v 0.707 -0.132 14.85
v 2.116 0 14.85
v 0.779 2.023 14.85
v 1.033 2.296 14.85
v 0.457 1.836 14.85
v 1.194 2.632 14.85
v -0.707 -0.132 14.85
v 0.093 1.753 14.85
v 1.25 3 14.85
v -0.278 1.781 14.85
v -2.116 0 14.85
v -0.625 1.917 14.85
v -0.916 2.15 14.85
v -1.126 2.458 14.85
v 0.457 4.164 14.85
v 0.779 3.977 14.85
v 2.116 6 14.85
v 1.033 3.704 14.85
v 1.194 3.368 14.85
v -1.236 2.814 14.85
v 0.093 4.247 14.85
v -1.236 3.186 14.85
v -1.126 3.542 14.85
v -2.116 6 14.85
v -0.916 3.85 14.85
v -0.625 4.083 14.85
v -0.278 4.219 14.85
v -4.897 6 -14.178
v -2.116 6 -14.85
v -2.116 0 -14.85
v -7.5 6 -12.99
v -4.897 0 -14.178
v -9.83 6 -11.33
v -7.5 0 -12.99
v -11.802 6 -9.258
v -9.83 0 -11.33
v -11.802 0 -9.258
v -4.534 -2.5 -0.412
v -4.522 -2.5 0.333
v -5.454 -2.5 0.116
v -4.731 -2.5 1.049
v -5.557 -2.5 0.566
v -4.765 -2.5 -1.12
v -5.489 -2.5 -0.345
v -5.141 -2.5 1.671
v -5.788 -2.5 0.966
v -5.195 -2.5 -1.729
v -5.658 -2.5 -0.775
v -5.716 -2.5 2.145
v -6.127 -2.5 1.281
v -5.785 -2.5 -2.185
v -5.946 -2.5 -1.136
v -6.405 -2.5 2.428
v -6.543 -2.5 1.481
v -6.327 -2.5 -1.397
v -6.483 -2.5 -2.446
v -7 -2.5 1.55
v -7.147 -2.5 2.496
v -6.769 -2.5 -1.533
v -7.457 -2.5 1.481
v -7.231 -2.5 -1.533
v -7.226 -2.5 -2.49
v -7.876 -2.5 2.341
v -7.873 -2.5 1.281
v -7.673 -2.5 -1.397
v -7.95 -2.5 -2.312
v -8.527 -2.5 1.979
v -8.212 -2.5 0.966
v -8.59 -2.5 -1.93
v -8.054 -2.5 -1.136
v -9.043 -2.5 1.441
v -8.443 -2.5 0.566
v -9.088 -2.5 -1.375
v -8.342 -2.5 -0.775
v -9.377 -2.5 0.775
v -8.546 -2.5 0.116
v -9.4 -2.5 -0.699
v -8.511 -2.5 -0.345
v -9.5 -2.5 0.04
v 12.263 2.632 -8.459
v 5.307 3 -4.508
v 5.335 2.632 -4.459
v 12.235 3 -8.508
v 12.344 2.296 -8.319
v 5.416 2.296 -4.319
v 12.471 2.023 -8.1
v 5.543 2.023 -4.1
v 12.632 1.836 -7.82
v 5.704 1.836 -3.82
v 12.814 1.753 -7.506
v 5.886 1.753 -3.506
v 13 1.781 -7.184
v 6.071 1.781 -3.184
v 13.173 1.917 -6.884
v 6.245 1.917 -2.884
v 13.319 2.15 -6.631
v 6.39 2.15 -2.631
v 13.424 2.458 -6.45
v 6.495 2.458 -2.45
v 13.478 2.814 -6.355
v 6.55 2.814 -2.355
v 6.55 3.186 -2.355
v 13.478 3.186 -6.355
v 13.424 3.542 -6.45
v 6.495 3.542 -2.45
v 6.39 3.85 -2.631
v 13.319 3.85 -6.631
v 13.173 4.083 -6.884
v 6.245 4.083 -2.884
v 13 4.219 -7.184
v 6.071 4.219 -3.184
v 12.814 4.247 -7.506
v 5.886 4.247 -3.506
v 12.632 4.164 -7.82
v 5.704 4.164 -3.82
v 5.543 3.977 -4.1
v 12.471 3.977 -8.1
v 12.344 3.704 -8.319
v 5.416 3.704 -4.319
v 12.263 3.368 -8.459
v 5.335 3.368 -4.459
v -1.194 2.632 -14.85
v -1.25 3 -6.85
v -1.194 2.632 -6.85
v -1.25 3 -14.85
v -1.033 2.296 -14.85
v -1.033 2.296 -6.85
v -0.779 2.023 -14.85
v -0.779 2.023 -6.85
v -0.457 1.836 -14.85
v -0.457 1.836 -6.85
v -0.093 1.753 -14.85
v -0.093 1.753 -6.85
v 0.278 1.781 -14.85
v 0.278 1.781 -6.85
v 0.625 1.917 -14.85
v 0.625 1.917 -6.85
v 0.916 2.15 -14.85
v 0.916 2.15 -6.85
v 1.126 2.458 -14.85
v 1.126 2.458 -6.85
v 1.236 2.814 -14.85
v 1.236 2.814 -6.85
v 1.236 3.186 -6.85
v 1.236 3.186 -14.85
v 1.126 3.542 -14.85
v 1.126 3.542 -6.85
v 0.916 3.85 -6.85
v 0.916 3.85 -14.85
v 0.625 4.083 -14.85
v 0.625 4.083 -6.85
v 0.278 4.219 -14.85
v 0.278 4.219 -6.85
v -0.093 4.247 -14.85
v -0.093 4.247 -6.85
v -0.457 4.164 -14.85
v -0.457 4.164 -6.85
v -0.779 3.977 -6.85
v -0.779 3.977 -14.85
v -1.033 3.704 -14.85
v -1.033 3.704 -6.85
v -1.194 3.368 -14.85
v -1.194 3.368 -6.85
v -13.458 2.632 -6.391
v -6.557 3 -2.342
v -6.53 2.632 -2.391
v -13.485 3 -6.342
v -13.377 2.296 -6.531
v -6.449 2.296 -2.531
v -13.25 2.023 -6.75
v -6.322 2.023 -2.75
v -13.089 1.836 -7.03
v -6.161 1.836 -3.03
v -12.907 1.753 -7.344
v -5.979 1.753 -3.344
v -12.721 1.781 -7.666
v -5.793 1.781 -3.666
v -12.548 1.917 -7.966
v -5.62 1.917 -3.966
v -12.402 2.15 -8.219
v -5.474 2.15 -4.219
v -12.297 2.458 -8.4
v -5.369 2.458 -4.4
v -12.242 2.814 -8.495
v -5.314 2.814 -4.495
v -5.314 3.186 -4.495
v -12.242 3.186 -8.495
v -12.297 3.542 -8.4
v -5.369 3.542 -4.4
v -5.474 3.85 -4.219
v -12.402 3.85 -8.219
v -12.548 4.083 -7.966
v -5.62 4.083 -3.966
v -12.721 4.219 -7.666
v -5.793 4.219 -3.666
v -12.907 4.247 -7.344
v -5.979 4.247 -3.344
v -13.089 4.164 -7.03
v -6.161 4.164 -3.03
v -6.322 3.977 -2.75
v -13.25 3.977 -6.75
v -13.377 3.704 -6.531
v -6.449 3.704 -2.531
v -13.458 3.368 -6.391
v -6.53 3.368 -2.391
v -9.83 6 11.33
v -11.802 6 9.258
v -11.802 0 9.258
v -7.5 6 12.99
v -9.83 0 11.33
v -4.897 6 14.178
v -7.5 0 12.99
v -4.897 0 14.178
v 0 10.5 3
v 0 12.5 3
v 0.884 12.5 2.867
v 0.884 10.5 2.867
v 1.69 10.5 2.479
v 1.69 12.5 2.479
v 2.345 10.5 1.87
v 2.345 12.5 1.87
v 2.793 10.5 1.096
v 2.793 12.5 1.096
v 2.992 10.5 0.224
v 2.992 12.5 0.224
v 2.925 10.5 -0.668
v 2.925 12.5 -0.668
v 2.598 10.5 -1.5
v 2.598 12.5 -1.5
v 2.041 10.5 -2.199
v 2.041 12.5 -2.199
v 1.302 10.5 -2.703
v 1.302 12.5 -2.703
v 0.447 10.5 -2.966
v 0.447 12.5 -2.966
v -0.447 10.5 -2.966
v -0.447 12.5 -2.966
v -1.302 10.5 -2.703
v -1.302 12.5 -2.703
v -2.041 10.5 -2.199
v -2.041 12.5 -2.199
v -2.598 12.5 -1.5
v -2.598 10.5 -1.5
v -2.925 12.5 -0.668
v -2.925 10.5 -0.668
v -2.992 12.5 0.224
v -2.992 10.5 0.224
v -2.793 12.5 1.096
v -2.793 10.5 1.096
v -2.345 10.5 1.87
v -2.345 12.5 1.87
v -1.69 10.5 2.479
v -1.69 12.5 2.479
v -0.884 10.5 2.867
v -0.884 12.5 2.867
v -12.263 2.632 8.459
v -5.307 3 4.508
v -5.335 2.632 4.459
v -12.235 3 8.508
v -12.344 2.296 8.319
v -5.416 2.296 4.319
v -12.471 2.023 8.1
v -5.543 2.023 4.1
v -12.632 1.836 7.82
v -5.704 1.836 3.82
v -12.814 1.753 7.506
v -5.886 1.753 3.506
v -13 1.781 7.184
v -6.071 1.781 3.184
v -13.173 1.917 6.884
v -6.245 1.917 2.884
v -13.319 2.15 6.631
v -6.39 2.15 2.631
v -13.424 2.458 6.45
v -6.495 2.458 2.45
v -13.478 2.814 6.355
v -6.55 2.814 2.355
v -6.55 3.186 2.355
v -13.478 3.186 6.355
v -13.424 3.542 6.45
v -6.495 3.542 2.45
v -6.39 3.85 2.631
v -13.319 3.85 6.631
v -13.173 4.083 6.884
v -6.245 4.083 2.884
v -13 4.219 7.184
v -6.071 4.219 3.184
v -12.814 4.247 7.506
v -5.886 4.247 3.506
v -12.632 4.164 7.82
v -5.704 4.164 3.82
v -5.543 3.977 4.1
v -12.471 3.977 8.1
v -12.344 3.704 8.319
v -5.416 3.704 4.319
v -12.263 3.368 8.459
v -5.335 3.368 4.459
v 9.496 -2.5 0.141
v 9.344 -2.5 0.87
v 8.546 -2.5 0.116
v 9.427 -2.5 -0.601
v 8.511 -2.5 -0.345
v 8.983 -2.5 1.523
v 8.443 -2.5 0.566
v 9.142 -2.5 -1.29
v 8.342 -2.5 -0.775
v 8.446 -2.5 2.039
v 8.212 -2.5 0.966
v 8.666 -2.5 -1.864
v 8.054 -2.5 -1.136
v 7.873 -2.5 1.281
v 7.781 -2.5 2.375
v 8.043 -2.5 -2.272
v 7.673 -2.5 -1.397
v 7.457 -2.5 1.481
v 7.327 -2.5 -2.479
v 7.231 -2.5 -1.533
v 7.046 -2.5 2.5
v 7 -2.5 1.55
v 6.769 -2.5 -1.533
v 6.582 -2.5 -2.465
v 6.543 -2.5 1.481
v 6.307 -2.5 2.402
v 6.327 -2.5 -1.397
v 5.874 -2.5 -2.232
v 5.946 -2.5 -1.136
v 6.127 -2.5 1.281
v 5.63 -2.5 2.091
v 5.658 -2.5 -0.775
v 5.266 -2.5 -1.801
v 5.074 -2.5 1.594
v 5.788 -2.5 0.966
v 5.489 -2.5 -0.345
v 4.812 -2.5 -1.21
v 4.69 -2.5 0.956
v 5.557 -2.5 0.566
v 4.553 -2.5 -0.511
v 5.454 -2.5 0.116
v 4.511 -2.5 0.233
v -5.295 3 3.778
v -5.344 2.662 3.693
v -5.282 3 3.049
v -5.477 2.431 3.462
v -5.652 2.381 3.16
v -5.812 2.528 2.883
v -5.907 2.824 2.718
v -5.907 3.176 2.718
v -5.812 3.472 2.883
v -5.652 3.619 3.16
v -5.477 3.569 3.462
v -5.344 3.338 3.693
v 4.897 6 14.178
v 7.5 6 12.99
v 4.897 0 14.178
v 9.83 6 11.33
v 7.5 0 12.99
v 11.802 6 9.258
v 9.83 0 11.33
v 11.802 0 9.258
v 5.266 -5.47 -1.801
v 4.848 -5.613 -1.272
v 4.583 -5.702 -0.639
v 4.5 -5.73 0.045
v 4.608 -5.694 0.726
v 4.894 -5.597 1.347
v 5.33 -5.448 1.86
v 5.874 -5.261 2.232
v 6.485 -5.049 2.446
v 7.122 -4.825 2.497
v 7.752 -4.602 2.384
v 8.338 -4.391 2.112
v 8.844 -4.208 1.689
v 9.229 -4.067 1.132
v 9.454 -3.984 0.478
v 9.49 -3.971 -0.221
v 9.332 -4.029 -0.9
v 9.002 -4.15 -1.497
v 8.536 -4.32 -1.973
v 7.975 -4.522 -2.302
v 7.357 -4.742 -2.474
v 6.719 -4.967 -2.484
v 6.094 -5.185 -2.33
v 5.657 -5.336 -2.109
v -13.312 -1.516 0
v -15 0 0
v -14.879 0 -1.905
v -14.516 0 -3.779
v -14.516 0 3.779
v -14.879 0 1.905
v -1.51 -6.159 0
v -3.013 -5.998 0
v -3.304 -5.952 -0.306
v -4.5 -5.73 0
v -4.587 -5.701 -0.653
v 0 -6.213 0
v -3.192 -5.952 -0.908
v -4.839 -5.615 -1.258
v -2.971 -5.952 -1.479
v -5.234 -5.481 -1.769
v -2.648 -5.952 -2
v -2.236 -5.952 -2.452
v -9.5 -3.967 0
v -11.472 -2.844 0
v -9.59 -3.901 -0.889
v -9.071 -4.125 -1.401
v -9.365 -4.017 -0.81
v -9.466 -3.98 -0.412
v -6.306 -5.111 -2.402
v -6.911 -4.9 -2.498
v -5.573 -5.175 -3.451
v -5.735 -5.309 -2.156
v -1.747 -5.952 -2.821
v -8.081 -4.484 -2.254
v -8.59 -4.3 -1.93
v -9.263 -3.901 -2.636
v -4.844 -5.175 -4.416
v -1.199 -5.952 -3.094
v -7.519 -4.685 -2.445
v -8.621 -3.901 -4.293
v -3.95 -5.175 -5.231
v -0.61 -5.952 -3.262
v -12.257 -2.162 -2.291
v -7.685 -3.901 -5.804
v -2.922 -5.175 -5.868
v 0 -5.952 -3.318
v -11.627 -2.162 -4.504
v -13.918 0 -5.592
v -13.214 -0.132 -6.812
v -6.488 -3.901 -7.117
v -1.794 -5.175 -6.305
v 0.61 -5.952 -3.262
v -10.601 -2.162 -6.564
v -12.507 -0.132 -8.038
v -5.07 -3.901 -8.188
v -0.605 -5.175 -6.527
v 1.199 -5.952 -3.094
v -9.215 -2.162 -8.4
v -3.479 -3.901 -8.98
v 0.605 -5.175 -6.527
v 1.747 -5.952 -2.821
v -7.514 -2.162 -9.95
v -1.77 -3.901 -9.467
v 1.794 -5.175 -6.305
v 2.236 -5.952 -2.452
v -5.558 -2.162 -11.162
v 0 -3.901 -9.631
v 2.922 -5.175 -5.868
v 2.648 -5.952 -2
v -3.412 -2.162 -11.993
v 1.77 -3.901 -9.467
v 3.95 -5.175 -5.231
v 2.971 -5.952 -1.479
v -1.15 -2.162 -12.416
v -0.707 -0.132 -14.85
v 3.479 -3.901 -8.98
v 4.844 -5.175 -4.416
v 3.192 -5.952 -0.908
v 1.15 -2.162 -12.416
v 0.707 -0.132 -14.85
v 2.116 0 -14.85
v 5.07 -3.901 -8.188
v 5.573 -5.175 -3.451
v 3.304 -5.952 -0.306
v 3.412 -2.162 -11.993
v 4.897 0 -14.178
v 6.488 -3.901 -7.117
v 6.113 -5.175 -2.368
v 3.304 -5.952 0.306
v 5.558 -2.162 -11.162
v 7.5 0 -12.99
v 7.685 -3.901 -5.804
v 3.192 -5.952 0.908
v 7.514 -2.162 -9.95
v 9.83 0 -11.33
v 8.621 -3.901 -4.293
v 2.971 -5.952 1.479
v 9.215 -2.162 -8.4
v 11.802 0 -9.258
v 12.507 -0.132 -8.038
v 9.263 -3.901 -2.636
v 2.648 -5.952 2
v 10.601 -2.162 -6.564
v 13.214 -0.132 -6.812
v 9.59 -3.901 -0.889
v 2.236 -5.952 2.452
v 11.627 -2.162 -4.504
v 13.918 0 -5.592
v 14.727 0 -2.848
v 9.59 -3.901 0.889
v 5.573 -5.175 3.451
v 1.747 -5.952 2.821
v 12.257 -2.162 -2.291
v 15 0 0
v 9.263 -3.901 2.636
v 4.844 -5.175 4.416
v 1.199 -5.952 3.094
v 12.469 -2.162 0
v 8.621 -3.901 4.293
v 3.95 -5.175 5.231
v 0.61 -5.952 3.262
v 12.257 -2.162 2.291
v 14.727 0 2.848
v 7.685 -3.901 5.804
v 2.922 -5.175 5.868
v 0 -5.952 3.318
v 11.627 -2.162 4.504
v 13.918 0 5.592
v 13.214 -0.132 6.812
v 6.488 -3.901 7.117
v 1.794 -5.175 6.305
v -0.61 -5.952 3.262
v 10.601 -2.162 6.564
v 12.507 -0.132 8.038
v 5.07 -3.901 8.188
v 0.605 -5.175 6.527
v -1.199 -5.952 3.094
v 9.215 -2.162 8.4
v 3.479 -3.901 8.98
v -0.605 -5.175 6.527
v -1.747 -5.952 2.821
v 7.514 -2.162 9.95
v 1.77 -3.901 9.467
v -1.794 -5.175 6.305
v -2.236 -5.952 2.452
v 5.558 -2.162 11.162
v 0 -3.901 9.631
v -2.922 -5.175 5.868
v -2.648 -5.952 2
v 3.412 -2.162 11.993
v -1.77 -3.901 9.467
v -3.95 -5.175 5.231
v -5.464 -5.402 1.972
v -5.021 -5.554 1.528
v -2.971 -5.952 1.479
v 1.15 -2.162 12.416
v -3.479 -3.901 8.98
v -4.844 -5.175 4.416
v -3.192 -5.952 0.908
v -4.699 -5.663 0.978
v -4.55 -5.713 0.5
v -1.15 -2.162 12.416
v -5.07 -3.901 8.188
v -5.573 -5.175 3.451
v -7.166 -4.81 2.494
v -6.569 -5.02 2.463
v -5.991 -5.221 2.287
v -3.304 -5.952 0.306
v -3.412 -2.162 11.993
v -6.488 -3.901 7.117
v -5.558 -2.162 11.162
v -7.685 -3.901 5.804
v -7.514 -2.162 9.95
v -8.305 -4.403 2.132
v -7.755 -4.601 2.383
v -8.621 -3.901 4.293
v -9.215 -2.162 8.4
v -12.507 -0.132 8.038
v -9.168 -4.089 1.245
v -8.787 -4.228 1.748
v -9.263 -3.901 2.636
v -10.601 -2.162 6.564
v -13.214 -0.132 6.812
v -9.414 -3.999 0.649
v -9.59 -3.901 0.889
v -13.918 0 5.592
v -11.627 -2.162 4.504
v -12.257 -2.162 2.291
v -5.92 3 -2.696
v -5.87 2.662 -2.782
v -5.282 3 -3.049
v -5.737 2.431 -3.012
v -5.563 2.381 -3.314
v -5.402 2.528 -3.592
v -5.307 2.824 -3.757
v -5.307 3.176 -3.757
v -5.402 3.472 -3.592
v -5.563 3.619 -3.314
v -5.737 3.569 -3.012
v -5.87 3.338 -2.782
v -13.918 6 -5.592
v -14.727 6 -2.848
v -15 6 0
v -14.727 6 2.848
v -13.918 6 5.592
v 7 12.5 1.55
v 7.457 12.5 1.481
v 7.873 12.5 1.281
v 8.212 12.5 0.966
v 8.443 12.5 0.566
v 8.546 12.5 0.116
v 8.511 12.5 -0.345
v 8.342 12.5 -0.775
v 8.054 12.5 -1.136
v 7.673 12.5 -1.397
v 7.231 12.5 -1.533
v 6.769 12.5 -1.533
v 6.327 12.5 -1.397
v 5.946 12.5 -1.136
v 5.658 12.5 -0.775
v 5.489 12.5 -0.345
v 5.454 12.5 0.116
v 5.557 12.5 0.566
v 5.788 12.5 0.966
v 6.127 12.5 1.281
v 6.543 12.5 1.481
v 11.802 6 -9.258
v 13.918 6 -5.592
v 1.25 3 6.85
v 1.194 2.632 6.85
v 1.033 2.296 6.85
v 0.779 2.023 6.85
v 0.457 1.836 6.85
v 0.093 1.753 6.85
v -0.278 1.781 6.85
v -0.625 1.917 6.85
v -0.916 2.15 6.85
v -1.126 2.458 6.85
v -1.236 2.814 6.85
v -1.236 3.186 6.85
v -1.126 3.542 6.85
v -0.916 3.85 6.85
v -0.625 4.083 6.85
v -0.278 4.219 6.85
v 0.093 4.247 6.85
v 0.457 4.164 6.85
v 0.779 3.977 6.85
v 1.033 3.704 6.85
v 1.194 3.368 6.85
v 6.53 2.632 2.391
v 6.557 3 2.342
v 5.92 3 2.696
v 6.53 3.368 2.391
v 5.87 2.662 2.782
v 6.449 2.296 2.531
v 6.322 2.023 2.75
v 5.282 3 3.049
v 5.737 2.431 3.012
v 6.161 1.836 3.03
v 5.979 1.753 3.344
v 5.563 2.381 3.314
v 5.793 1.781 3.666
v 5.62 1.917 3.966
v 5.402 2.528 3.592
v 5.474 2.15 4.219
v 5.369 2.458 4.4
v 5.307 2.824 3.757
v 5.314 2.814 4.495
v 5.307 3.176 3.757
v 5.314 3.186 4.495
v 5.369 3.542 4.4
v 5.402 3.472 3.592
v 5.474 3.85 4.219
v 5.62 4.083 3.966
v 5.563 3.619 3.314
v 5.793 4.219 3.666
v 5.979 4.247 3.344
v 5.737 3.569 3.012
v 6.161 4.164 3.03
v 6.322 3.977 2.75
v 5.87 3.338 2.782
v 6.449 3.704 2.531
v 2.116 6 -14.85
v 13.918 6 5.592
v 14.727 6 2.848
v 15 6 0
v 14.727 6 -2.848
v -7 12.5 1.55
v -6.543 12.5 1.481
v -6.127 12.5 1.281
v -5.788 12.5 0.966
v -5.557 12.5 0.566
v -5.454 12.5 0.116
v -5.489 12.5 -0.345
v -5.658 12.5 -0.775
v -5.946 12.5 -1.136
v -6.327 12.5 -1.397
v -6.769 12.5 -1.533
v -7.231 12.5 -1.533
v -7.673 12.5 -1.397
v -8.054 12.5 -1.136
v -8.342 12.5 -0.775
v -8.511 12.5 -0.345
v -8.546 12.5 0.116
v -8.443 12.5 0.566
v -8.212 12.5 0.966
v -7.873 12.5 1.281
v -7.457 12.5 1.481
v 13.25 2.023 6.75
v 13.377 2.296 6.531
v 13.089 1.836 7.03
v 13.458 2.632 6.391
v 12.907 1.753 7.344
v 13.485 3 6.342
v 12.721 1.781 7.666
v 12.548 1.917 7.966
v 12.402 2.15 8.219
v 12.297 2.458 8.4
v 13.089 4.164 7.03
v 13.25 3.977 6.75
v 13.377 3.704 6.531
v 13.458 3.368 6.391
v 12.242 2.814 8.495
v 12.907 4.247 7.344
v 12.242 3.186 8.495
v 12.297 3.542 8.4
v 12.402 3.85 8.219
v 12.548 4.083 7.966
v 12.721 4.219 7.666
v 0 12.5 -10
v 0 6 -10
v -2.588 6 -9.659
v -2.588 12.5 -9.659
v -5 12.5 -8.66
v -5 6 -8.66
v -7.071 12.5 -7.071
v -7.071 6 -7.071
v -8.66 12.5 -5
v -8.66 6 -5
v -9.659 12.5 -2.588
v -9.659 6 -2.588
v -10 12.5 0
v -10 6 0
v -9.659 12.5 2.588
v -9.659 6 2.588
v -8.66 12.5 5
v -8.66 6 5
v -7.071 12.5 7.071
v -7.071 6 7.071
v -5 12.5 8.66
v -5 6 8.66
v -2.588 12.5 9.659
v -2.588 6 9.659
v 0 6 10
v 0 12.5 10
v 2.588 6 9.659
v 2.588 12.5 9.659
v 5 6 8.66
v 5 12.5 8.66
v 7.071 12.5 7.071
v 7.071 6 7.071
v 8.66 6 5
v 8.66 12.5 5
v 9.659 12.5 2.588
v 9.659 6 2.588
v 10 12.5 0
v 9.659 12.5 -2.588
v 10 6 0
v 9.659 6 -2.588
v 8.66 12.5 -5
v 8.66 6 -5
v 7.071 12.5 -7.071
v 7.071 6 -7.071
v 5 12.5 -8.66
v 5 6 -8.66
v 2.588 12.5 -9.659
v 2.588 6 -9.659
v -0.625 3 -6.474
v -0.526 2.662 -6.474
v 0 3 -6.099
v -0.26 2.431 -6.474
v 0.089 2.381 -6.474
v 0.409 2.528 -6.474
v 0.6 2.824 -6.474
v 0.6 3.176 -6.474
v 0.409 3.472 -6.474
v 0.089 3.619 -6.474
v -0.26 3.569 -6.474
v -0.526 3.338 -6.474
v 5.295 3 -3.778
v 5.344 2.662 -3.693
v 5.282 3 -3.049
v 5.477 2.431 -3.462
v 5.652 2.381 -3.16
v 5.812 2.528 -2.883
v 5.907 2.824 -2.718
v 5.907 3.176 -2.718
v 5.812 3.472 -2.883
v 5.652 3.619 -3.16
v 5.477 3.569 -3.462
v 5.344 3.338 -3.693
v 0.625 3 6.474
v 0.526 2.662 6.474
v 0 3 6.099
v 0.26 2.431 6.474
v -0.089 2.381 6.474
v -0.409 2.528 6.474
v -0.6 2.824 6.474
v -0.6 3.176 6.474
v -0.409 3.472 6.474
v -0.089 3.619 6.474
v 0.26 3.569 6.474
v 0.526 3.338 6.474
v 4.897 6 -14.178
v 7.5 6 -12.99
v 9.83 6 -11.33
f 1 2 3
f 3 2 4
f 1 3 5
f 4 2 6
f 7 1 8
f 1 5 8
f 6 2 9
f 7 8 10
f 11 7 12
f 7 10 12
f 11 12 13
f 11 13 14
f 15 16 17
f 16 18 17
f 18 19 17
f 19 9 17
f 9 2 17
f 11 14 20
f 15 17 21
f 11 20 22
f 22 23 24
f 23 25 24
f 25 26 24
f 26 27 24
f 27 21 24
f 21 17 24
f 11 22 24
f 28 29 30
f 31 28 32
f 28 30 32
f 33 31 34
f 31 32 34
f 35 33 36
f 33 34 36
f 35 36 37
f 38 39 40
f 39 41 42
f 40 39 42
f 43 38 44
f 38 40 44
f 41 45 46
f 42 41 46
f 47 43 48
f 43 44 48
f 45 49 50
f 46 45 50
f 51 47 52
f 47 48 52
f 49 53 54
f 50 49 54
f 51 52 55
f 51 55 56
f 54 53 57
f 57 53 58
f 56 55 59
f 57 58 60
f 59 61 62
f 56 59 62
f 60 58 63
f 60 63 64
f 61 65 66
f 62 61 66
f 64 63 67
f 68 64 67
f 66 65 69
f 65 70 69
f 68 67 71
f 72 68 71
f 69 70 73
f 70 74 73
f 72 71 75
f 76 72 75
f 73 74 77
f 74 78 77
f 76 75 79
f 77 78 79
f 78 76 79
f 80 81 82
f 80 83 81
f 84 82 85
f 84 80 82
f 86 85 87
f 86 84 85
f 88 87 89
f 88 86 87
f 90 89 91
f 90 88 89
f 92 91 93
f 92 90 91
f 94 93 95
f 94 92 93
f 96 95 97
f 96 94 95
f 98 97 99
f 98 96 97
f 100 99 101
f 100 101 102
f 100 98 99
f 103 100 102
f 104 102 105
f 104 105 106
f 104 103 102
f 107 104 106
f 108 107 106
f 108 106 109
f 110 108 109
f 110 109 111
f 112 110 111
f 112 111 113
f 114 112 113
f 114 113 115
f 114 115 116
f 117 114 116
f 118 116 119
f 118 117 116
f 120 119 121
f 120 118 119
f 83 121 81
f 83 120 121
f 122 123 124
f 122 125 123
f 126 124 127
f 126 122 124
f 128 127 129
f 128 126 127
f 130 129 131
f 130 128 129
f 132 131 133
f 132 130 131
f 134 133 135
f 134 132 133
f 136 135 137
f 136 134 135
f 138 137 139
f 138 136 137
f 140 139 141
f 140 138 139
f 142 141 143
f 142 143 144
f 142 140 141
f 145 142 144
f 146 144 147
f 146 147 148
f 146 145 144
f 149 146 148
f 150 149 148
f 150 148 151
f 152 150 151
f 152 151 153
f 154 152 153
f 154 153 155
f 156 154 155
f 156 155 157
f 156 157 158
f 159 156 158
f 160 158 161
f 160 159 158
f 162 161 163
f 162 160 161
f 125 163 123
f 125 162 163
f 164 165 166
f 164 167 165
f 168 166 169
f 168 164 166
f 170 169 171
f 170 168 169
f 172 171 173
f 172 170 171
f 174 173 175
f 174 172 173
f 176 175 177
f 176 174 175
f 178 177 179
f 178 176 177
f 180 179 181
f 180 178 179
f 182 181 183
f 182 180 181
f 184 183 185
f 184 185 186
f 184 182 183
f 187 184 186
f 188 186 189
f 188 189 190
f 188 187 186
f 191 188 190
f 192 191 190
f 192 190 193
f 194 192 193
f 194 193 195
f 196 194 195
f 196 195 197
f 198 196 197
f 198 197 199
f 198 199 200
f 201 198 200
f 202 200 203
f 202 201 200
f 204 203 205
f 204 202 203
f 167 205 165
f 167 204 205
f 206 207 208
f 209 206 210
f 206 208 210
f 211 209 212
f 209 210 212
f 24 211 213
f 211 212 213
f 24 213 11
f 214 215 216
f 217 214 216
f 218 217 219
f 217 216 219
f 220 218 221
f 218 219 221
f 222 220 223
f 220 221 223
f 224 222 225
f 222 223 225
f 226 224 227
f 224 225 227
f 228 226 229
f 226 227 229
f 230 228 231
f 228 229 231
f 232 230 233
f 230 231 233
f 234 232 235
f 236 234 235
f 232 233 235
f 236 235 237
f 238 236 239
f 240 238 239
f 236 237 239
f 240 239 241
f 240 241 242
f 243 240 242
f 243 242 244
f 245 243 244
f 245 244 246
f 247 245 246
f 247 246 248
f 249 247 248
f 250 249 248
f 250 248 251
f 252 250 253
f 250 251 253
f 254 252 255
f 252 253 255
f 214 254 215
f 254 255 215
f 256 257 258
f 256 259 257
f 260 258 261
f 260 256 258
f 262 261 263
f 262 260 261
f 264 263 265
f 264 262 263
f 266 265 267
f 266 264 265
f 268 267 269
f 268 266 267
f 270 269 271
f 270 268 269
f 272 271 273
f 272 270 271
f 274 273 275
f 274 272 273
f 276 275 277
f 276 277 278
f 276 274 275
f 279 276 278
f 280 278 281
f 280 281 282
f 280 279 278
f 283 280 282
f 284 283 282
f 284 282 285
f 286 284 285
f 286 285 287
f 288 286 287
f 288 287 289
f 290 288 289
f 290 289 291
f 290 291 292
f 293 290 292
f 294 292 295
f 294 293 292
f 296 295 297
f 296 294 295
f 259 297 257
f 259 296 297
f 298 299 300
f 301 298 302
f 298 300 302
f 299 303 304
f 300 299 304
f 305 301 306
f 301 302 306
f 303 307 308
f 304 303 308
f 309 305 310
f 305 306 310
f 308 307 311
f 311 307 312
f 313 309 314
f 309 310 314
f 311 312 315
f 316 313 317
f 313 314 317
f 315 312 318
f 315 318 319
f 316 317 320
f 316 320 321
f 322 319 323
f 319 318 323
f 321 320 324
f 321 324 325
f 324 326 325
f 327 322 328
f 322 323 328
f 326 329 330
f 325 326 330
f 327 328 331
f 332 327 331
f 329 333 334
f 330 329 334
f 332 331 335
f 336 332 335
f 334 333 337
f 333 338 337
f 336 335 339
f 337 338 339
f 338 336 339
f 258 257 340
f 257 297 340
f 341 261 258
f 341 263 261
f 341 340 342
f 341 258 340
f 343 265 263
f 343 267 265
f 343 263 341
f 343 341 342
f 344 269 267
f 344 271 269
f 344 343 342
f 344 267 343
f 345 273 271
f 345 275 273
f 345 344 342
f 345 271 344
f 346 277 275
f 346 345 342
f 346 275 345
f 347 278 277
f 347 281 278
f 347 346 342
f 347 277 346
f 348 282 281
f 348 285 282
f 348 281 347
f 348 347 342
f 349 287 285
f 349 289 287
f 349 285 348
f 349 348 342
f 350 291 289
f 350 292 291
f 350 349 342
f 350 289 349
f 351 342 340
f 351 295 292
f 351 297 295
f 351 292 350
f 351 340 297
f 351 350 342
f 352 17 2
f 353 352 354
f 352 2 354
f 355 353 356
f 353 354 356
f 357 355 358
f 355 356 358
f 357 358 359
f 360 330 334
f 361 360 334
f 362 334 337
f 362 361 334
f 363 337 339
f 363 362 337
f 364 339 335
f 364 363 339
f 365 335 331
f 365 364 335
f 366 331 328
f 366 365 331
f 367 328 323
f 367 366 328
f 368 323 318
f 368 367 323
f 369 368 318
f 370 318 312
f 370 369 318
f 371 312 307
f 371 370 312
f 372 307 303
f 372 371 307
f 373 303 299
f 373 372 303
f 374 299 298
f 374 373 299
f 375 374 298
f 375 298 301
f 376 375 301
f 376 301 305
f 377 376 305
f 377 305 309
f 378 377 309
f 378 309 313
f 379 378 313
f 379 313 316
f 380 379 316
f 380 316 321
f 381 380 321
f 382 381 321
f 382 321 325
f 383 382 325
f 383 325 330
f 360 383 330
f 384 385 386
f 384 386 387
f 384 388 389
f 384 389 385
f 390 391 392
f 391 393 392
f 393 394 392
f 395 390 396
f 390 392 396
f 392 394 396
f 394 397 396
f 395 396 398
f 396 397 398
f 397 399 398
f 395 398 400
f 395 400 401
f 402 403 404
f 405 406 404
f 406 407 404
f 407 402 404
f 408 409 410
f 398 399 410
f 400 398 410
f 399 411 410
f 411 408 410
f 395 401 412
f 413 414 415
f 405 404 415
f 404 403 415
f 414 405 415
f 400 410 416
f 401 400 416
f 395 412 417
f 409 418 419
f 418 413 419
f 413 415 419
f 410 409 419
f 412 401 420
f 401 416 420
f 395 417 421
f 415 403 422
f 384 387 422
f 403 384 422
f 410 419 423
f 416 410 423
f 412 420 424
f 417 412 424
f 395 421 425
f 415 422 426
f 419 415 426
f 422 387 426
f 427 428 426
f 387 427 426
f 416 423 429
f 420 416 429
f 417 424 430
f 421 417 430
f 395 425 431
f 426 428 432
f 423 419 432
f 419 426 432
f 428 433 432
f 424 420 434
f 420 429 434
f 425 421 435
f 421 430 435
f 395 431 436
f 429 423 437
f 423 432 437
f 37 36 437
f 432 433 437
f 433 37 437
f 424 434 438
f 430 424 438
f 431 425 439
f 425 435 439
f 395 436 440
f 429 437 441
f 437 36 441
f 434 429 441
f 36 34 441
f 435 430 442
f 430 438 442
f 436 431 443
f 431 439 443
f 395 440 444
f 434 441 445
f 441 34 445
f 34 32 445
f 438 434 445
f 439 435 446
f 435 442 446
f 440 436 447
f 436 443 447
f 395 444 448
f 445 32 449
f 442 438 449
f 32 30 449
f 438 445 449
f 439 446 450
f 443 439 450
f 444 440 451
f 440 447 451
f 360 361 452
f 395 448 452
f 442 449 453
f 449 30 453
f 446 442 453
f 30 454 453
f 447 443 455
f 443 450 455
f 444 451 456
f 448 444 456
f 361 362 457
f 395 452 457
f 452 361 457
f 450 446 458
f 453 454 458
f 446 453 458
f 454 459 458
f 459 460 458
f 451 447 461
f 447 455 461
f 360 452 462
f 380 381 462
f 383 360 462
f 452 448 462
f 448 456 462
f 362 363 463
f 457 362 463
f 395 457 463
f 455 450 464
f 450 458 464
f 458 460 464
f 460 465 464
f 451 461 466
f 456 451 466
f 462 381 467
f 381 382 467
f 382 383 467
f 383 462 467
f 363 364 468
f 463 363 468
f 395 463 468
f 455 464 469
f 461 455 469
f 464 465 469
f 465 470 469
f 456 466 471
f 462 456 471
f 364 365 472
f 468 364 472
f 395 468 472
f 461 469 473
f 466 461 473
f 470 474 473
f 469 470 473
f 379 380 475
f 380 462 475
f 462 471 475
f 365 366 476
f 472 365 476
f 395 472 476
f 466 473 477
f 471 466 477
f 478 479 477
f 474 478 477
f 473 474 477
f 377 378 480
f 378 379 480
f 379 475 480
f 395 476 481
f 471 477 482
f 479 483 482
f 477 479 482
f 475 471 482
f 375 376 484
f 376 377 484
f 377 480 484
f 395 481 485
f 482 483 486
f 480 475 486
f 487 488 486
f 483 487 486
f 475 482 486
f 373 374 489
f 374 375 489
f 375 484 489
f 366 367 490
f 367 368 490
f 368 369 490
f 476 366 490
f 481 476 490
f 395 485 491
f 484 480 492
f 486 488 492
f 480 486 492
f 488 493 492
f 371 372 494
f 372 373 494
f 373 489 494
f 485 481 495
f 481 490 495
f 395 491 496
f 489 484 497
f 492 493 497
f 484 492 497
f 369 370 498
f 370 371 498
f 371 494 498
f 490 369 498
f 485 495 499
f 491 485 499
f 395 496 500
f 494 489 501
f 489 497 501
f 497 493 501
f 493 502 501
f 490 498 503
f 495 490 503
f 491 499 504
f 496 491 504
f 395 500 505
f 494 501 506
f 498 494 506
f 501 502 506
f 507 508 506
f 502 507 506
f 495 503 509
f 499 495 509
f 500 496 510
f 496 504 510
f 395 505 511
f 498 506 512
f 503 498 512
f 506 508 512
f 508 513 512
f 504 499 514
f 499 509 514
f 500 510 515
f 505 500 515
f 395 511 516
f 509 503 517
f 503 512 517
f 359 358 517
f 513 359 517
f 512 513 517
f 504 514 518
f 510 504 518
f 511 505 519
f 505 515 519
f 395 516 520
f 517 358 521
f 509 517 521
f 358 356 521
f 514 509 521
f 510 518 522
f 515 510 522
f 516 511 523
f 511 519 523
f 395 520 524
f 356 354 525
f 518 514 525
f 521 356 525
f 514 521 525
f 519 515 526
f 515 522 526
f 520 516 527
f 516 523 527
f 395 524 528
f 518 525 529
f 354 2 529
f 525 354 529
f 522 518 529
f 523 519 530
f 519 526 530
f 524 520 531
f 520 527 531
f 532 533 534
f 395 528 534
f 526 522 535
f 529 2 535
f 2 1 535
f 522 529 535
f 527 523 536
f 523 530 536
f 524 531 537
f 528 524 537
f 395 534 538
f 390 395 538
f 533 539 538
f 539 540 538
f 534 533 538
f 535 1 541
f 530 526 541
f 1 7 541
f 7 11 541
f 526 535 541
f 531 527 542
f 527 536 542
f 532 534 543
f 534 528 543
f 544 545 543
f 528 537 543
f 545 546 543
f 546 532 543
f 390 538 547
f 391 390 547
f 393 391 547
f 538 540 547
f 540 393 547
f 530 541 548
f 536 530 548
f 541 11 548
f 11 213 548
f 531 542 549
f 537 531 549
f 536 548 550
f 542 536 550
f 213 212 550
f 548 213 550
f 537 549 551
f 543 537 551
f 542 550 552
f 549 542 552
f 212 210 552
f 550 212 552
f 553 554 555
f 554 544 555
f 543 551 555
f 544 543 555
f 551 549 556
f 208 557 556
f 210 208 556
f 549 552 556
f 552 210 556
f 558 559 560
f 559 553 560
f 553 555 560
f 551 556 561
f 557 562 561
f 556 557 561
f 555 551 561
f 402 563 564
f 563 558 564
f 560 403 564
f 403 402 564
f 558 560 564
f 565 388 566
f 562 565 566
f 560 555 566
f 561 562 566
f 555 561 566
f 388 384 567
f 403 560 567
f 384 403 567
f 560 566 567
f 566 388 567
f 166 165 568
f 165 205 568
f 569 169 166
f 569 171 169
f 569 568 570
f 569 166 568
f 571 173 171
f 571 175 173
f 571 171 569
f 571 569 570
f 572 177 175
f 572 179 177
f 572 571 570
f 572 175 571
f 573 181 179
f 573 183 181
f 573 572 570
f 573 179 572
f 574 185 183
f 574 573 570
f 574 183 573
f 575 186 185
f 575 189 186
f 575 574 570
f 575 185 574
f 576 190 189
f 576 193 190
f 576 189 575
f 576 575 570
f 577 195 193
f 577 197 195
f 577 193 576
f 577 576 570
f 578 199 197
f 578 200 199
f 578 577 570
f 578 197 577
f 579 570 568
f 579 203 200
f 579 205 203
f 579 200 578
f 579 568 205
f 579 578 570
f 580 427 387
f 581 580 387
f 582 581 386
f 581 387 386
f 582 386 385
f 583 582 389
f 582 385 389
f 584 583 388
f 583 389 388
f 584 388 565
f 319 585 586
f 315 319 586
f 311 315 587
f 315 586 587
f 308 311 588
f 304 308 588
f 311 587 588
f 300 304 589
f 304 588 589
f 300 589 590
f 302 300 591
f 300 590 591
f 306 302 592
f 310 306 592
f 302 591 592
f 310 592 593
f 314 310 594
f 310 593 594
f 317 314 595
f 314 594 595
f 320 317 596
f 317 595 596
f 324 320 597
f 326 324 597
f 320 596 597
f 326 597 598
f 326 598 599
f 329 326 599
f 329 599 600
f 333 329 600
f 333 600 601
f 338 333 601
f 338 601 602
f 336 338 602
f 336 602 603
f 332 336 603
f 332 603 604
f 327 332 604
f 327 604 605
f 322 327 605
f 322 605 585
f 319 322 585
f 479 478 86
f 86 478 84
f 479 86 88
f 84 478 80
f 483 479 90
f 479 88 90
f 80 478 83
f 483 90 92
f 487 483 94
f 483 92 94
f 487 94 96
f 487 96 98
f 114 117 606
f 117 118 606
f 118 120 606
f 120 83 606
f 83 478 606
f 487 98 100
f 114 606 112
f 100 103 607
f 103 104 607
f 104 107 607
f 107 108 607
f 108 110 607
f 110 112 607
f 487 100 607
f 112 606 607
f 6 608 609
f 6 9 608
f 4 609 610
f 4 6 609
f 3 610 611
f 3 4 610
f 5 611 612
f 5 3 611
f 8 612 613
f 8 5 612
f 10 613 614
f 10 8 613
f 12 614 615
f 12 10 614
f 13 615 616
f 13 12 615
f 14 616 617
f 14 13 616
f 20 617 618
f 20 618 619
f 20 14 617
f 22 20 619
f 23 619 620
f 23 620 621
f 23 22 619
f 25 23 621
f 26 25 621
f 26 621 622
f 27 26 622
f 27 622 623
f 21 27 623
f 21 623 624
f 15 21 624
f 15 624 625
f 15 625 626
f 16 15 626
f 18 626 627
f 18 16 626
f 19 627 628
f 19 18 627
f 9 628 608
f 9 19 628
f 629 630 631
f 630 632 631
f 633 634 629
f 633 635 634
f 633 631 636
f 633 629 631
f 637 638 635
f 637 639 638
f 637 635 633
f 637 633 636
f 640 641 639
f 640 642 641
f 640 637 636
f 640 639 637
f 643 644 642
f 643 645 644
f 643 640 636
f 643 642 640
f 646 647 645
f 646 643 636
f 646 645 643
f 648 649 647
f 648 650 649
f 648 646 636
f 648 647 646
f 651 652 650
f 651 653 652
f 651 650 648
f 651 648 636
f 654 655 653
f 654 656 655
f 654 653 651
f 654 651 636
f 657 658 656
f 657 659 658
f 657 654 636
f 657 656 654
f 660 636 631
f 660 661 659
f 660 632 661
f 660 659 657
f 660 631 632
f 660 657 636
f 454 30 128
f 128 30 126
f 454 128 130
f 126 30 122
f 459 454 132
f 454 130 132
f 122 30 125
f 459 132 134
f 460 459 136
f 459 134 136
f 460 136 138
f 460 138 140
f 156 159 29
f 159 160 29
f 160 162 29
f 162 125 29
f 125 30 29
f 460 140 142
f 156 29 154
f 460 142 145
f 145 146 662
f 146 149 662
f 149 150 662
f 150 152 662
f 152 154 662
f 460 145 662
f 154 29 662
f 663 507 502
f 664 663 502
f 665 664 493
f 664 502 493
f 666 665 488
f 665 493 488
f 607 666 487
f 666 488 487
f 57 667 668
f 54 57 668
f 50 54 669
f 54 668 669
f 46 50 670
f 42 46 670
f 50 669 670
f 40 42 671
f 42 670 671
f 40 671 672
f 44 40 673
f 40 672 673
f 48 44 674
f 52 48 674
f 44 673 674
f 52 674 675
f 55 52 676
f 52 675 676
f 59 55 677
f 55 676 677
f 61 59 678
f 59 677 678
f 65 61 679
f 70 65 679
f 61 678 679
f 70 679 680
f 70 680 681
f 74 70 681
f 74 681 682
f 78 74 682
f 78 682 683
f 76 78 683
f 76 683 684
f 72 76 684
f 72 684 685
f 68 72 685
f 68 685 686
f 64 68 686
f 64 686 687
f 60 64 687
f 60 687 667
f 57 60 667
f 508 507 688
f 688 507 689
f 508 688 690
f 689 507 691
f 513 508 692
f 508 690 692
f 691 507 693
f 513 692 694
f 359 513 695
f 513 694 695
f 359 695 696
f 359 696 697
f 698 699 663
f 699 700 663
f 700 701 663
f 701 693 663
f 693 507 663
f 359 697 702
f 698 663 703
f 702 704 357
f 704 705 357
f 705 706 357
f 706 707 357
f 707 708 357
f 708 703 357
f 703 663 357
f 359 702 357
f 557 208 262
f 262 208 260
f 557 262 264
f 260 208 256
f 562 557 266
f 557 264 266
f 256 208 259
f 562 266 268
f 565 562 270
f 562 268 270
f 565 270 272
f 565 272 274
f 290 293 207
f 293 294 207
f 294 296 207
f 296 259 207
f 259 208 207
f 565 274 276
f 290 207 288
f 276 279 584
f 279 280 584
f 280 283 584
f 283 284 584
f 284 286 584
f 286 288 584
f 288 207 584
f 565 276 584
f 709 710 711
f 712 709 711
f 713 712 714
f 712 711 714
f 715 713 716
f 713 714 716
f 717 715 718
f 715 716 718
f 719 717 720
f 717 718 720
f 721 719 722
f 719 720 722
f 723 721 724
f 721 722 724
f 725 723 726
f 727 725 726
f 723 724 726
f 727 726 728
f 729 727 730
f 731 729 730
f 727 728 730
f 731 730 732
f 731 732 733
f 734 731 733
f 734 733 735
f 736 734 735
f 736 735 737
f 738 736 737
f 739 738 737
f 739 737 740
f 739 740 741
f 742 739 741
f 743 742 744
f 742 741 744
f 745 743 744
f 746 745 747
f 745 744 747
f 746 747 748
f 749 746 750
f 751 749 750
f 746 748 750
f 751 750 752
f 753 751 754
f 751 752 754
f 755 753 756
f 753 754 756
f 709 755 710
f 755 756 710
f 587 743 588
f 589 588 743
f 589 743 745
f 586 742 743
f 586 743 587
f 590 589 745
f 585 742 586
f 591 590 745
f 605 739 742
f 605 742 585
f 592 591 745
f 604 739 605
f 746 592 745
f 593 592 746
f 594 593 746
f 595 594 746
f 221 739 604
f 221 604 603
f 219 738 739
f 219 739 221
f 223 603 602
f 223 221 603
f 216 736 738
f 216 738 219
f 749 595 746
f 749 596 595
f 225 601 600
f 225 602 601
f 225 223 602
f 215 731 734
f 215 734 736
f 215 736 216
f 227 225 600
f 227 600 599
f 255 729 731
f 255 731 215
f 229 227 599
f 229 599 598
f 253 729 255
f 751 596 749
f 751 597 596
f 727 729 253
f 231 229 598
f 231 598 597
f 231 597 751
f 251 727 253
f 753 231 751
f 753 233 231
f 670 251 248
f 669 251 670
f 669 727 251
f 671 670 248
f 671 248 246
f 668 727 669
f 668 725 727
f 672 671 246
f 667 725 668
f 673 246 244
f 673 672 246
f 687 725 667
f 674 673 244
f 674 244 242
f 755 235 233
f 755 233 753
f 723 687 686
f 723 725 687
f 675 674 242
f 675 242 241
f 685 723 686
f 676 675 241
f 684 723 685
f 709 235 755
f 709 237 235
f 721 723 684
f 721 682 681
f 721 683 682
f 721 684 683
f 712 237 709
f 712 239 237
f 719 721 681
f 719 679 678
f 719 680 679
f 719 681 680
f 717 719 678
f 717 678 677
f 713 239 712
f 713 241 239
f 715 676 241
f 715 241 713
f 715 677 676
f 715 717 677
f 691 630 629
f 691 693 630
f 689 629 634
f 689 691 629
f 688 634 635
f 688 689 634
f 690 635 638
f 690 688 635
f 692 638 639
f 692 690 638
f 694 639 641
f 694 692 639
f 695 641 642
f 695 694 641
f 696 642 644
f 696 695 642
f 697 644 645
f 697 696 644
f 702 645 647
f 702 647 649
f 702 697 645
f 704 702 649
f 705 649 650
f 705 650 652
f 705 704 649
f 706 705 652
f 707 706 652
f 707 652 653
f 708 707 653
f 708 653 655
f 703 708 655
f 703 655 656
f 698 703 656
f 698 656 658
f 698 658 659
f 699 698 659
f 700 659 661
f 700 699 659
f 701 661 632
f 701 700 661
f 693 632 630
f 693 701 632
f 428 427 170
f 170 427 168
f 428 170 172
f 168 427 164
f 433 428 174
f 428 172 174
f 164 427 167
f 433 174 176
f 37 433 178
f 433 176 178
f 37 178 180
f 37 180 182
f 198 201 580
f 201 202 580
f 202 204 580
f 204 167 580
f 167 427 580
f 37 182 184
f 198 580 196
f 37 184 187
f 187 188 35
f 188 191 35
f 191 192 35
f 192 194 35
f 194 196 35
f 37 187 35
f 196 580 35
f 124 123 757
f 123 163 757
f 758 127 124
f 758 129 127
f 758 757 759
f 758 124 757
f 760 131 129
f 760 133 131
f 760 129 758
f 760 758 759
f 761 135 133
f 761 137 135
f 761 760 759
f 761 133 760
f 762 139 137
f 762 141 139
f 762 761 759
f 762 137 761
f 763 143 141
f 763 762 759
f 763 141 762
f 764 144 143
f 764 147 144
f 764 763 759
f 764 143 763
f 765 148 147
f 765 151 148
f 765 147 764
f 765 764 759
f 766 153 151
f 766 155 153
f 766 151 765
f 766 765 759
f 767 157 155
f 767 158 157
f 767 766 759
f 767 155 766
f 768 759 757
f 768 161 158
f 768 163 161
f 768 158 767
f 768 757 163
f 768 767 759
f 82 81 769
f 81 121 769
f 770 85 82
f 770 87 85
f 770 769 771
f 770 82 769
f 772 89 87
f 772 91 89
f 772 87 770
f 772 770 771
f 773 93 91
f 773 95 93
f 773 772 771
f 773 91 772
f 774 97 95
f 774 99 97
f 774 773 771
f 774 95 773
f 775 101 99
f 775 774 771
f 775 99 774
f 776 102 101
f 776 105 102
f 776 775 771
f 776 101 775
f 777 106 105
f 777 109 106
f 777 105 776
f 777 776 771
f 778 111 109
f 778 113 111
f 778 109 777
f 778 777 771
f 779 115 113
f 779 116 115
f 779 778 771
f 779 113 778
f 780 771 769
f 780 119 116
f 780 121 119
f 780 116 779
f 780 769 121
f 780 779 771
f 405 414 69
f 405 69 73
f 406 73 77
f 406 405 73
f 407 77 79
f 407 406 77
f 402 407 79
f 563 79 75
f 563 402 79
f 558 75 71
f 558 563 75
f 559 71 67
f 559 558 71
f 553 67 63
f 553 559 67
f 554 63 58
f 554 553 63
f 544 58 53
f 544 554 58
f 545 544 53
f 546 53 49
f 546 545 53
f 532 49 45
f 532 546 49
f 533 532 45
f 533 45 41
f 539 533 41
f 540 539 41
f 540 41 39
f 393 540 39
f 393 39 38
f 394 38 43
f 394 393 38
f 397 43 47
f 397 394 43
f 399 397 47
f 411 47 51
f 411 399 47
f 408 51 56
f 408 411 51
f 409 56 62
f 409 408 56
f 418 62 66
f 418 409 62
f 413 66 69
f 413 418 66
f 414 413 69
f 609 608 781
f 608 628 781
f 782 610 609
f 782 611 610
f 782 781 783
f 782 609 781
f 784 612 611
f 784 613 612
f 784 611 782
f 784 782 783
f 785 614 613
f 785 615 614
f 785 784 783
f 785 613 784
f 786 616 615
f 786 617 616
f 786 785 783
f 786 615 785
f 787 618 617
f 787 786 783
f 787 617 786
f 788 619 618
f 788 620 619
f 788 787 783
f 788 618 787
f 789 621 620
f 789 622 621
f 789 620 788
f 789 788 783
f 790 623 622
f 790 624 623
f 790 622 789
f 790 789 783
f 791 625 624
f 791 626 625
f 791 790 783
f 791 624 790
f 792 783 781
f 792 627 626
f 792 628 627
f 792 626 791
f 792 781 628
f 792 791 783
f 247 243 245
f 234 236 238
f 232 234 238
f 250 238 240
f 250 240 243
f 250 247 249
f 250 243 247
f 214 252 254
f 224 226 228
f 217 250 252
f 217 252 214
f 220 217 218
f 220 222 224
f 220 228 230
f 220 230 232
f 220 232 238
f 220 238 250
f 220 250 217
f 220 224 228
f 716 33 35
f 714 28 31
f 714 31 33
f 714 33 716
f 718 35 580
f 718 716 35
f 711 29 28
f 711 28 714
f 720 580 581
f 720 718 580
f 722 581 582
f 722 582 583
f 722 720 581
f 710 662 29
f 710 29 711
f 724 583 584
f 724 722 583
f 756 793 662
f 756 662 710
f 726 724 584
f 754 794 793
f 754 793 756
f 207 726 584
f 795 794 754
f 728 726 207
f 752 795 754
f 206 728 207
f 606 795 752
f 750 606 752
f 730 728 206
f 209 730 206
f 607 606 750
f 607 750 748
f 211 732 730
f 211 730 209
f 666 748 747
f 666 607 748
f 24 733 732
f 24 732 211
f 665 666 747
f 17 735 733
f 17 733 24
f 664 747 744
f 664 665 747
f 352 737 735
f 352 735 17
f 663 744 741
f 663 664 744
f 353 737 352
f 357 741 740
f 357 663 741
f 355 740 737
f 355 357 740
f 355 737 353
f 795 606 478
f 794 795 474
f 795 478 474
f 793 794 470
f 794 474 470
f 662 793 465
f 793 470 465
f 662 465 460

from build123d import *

# Parameters (mm, degrees)
SKETCH_1_R               = 15
EXTRUDE_1_DEPTH          = 6
SKETCH_2_R               = 10
EXTRUDE_2_DEPTH          = 6.5
SKETCH_5_R               = 1.55
CUT_EXTRUDE_967_DEPTH    = 29.287523448
SKETCH_6_R               = 2.5
CUT_EXTRUDE_1129_DEPTH   = 3.7
CUT_EXTRUDE_3_DEPTH      = 25.477792773
PATTERN_CIRCULAR_1_COUNT = 6
SKETCH_12_R              = 3
CUT_EXTRUDE_4_DEPTH      = 2


with BuildPart() as part:
    # 草图1 → 凸台-拉伸1 (new body)
    with BuildSketch(Plane(origin=(0, 0, 0), x_dir=(1, 0, 0), z_dir=(0, 1, 0))):
        with Locations(Location((0, 0, 0), (0, 0, 270))):
            Circle(SKETCH_1_R)
    extrude(amount=EXTRUDE_1_DEPTH)

    # 草图2 → 凸台-拉伸2 (add)
    with BuildSketch(Plane(origin=(0, 6, 0), x_dir=(1, 0, 0), z_dir=(0, 1, 0))):
        with Locations(Location((0, 0, 0), (0, 0, 90))):
            Circle(SKETCH_2_R)
    extrude(amount=EXTRUDE_2_DEPTH)

    # 草图4 → 旋转1 (revolve)
    with BuildSketch(Plane.XY, mode=Mode.PRIVATE) as revolve_1_sk:
        with BuildLine():
            Line((0, 0), (0, -6.213203436))
            ThreePointArc((0, -6.213203436), (8.117941502, -4.598444473), (15, 0))
            Line((15, 0), (0, 0))
        make_face()
    revolve(revolve_1_sk.sketch.rotate(Axis((0, 0, 0), (0, -1, 0)), 180), axis=Axis((0, 0, 0), (0, -1, 0)))

    # 草图5 → Cut-Extrude 967 (cut, through all)
    with BuildSketch(Plane(origin=(0, 12.5, 0), x_dir=(1, 0, 0), z_dir=(0, 1, 0))):
        with Locations(Location((7, 0, 0), (0, 0, 270))):
            Circle(SKETCH_5_R)
        with Locations(Location((-7, 0, 0), (0, 0, 270))):
            Circle(SKETCH_5_R)
    extrude(amount=-CUT_EXTRUDE_967_DEPTH, mode=Mode.SUBTRACT)

    # 草图6 → Cut-Extrude 1129 (cut)
    with BuildSketch(Plane(origin=(0, -6.2, 0), x_dir=(1, 0, 0), z_dir=(0, 1, 0))):
        with Locations(Location((-7, 0, 0), (0, 0, 129.482318069))):
            Circle(SKETCH_6_R)
        with Locations(Location((7, 0, 0), (0, 0, 133.910612472))):
            Circle(SKETCH_6_R)
    extrude(amount=CUT_EXTRUDE_1129_DEPTH, mode=Mode.SUBTRACT)

    # 草图9 → 切除-拉伸3 (cut, through all)
    with BuildSketch(Plane(origin=(0, 6, 0), x_dir=(1, 0, 0), z_dir=(0, 1, 0))):
        with BuildLine():
            Line((11.802472048, 9.257518758), (13.918482445, 5.592481242))
            ThreePointArc((13.918482445, 5.592481242), (12.990381057, 7.5), (11.802472048, 9.257518758))
        make_face()
        with BuildLine():
            Line((-2.116010397, 14.85), (2.116010397, 14.85))
            ThreePointArc((2.116010397, 14.85), (0, 15), (-2.116010397, 14.85))
        make_face()
        with BuildLine():
            Line((13.918482445, -5.592481242), (11.802472048, -9.257518758))
            ThreePointArc((11.802472048, -9.257518758), (12.990381057, -7.5), (13.918482445, -5.592481242))
        make_face()
        with BuildLine():
            Line((2.116010397, -14.85), (-2.116010397, -14.85))
            ThreePointArc((-2.116010397, -14.85), (0, -15), (2.116010397, -14.85))
        make_face()
        with BuildLine():
            Line((-11.802472048, -9.257518758), (-13.918482445, -5.592481242))
            ThreePointArc((-13.918482445, -5.592481242), (-12.990381057, -7.5), (-11.802472048, -9.257518758))
        make_face()
        with BuildLine():
            Line((-13.918482445, 5.592481242), (-11.802472048, 9.257518758))
            ThreePointArc((-11.802472048, 9.257518758), (-12.990381057, 7.5), (-13.918482445, 5.592481242))
        make_face()
    extrude(amount=-CUT_EXTRUDE_3_DEPTH, mode=Mode.SUBTRACT)

    # 草图11 → M3 螺纹孔2 (revolve, cut)
    with BuildSketch(Plane(origin=(-12.860477246, 3, -7.425), x_dir=(-0.50000000000004, 0, 0.8660254037844157), z_dir=(0, 1, 0))):
        Polygon((0, 0), (0, 8.751075774), (1.25, 8), (1.25, 0), align=None)
    hole_wizard_m3_2 = revolve(axis=Axis((-18.35973856, 3, -10.6), (0.8660254037844156, 0, 0.5000000000000397)), mode=Mode.SUBTRACT)

    # 阵列(圆周)1: M3 螺纹孔2 ×6 about axis
    pattern_circular_1_axis = Axis((0, 6, 0), (0, 1, 0))
    for i in range(1, PATTERN_CIRCULAR_1_COUNT):
        add(hole_wizard_m3_2.rotate(pattern_circular_1_axis, i * 360 / PATTERN_CIRCULAR_1_COUNT), mode=Mode.SUBTRACT)

    # 草图12 → 切除-拉伸4 (cut)
    with BuildSketch(Plane(origin=(0, 12.5, 0), x_dir=(1, 0, 0), z_dir=(0, 1, 0))):
        with Locations(Location((0, 0, 0), (0, 0, 270))):
            Circle(SKETCH_12_R)
    extrude(amount=-CUT_EXTRUDE_4_DEPTH, mode=Mode.SUBTRACT)


solid = part.part
